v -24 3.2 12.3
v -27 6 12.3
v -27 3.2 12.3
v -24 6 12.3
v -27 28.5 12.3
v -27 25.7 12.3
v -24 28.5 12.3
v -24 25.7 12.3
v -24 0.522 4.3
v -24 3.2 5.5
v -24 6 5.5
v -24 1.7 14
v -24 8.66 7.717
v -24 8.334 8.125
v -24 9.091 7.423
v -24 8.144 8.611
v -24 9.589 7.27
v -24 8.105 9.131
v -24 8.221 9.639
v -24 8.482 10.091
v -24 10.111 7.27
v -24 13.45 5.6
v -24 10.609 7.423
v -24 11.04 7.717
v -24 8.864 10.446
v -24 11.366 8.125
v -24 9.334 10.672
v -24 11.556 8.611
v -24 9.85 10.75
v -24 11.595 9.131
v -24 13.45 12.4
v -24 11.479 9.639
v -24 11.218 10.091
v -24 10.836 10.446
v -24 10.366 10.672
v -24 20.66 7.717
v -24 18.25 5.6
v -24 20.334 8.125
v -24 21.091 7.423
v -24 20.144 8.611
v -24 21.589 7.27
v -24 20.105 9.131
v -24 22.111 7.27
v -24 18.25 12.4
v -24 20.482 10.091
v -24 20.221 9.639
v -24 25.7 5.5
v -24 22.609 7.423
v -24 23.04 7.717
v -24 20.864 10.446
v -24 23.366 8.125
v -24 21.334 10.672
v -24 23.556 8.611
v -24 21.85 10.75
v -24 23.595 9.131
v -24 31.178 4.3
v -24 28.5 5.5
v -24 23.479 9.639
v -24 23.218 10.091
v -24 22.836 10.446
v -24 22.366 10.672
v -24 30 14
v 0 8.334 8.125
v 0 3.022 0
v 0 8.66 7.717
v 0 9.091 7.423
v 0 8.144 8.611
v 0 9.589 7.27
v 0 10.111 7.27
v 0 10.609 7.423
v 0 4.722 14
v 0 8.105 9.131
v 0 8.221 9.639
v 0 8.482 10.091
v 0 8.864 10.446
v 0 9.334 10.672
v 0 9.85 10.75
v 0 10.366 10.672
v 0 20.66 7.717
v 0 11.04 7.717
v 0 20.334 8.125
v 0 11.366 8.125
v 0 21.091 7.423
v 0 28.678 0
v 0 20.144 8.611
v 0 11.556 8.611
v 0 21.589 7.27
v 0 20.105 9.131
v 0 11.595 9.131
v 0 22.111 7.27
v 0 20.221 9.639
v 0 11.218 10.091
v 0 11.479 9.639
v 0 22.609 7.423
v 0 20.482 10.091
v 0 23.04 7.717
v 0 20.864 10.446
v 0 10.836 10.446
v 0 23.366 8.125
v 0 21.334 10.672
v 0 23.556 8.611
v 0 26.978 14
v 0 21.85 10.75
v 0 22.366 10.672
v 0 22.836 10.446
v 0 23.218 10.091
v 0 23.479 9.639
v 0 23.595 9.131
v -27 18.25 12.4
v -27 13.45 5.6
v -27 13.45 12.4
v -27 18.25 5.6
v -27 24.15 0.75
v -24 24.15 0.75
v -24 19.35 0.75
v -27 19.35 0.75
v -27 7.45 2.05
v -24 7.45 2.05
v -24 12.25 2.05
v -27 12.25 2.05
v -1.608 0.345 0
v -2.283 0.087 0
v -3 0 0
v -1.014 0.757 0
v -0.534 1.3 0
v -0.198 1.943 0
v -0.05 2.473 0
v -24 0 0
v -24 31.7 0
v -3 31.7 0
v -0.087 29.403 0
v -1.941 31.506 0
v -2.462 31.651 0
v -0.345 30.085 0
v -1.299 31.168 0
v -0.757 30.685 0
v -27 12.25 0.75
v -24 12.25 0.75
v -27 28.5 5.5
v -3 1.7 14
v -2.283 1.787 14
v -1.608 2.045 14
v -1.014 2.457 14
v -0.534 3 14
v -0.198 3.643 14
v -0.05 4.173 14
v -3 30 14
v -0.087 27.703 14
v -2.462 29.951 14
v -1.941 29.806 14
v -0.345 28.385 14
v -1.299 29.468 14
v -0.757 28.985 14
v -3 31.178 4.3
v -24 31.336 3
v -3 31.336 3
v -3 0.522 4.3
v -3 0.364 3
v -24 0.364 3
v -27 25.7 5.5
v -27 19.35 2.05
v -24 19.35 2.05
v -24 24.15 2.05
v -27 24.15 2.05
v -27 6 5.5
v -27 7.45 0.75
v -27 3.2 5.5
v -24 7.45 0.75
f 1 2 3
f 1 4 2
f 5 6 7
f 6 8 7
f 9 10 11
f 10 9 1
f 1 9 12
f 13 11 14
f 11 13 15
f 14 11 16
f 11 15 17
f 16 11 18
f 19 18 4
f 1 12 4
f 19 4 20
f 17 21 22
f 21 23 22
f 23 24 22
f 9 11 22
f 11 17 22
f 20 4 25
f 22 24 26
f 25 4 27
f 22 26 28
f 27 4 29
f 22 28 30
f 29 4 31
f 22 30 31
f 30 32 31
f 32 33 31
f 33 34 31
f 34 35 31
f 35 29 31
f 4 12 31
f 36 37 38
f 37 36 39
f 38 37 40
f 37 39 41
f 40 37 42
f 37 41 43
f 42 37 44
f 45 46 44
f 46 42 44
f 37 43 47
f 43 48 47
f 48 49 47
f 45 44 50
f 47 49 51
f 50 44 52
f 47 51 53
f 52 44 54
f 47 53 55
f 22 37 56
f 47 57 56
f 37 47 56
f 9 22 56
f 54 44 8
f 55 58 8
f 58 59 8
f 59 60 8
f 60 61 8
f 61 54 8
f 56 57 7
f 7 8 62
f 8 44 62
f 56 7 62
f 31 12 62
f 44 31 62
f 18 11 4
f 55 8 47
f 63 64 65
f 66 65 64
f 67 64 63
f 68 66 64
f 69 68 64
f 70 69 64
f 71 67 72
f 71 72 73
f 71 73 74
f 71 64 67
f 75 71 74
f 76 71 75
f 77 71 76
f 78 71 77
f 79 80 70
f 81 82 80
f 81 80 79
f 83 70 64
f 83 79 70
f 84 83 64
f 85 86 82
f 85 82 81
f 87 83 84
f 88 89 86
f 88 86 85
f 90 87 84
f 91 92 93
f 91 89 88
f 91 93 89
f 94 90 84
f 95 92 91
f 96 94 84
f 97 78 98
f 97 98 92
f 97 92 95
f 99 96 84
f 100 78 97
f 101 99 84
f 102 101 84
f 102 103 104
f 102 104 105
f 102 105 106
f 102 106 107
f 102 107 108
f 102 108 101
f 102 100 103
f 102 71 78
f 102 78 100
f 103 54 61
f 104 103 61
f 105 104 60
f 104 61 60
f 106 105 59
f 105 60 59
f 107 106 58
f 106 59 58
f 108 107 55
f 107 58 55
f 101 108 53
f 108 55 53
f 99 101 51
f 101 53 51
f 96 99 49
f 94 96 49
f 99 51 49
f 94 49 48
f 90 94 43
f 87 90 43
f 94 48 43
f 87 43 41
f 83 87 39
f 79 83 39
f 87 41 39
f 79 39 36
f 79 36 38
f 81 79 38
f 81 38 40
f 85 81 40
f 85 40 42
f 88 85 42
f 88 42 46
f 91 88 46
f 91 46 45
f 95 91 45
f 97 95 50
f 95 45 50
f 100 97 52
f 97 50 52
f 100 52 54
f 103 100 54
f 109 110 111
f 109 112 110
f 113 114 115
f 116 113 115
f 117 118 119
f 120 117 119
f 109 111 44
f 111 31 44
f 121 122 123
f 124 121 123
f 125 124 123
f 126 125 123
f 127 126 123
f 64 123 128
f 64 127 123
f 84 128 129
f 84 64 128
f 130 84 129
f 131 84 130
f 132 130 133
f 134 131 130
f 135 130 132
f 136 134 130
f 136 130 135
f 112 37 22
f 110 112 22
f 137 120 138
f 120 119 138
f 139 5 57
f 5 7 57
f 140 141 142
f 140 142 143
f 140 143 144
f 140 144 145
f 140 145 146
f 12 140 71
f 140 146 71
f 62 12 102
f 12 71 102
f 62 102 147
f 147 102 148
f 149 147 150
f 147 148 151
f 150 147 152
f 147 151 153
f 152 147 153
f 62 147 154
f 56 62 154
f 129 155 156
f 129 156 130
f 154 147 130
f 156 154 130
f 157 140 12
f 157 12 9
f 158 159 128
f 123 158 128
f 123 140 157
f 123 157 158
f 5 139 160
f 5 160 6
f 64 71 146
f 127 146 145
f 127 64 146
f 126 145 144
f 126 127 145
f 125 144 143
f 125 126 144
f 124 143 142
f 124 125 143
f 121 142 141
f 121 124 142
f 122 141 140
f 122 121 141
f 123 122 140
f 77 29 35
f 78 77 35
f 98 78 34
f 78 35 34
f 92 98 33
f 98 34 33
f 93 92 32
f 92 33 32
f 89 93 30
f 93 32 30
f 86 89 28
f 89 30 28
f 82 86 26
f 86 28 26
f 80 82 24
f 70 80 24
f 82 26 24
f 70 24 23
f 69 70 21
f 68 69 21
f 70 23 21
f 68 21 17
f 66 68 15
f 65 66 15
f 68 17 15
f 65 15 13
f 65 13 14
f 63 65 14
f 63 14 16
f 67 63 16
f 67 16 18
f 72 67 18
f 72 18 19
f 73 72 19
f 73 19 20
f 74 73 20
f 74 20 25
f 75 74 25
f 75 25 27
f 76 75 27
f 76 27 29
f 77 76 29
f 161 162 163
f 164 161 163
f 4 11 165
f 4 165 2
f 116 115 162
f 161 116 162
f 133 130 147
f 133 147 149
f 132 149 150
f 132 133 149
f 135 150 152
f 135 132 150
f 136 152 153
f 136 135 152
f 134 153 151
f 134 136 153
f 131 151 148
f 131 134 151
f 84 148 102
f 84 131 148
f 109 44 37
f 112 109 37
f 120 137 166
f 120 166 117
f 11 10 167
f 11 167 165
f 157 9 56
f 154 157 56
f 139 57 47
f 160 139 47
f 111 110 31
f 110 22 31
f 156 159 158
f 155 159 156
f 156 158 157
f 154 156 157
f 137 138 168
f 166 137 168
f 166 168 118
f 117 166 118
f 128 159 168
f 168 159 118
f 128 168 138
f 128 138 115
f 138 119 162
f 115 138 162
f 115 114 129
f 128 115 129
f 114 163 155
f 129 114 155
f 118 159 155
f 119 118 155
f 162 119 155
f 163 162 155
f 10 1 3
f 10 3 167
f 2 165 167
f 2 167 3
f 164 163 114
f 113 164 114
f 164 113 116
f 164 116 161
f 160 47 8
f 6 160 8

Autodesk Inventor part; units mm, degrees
ref_plane "YZ Plane" through (0, 0, 0) normal (1, 0, 0) x (0, 1, 0)
ref_plane "XZ Plane" through (0, 0, 0) normal (0, 1, 0) x (-1, 0, 0)
ref_plane "XY Plane" through (0, 0, 0) normal (0, 0, 1) x (1, 0, 0)
sketch "スケッチ1" plane through (0, 0, 0) normal (1, 0, 0) x (0, 1, 0)
  line L0 (0, 0) -> (31.7, 0)
  line L1 (1.7, 14) -> (30, 14)
  line L2 (1.7, 14) -> (0, 0)
  line L3 (30, 14) -> (31.7, 0)
  dimension "d0" = 31.7
  dimension "d1" = 28.3
extrude "押し出し1" add sketch "スケッチ1" against normal blind 24
sketch "スケッチ2" plane through (-24, 0, 0) normal (-1, 0, 0) x (0, 0, 1)
  line L0 (0, 0) -> (14, 1.7) projected
  line L1 (3, 0.3643) -> (3, 31.3357)
  line L2 (14, 30) -> (0, 31.7) projected
  line L3 (4.3, 0.3643) -> (4.3, 31.3357)
  line L4 (4.3, 31.3357) -> (3, 31.3357)
  line L5 (4.3, 0.3643) -> (3, 0.3643)
  point P0 (4.3, 0.5221)
  point P1 (4.3, 31.1779)
extrude "押し出し2" cut sketch "スケッチ2" against normal blind 21 contours L1 L2 L3 L0
sketch "スケッチ4" plane through (-3, 0, 0) normal (-1, 0, 0) x (0, 0, 1)
  circle A0 centre (9, 9.85) radius 1.75
  circle A1 centre (9, 21.85) radius 1.75
  point P0 (0, 0)
  dimension "d10" = 3.5
  dimension "d11" = 3.5
extrude "押し出し4" cut sketch "スケッチ4" along normal mid plane 100
fillet "フィレット1" radius 3 2 edges at (0, 30.85, 7) (0, 0.85, 7)
sketch "スケッチ10" plane through (-24, 0, 0) normal (-1, 0, 0) x (0, 0, 1)
  line L0 (5.6, 13.45) -> (12.4, 13.45)
  line L1 (12.4, 13.45) -> (12.4, 18.25)
  line L2 (12.4, 18.25) -> (5.6, 18.25)
  line L3 (5.6, 18.25) -> (5.6, 13.45)
  line L4 (5.6, 13.45) -> (12.4, 18.25) construction
  line L5 (12.4, 13.45) -> (5.6, 18.25) construction
  line L6 (14, 1.7) -> (14, 30) projected
  point P0 (0, 0)
  point P1 (9, 15.85)
  point P2 (14, 15.85)
  dimension "d29" = 6.8
  dimension "d30" = 4.8
  dimension "d44" = 5
extrude "押し出し10" add sketch "スケッチ10" along normal blind 3
sketch "スケッチ11" plane through (-24, 0, 0) normal (-1, 0, 0) x (0, 0, 1)
  line L0 (12.3, 3.2) -> (5.5, 3.2)
  line L1 (5.5, 3.2) -> (5.5, 6)
  line L2 (5.5, 6) -> (12.3, 6)
  line L3 (12.3, 6) -> (12.3, 3.2)
  line L4 (12.3, 3.2) -> (5.5, 6) construction
  line L5 (5.5, 3.2) -> (12.3, 6) construction
  line L6 (12.3, 28.5) -> (5.5, 28.5)
  line L7 (5.5, 28.5) -> (5.5, 25.7)
  line L8 (5.5, 25.7) -> (12.3, 25.7)
  line L9 (12.3, 25.7) -> (12.3, 28.5)
  line L10 (12.3, 28.5) -> (5.5, 25.7) construction
  line L11 (5.5, 28.5) -> (12.3, 25.7) construction
  point P0 (0, 0)
  point P1 (8.9, 4.6)
  point P2 (8.9, 27.1)
  dimension "d33" = 6.8
  dimension "d34" = 2.8
  dimension "d35" = 6.8
  dimension "d36" = 2.8
extrude "押し出し11" add sketch "スケッチ11" along normal blind 3
sketch "スケッチ12" plane through (-24, 0, 0) normal (-1, 0, 0) x (0, 0, 1)
  line L0 (2.05, 24.15) -> (0.75, 24.15)
  line L1 (0.75, 24.15) -> (0.75, 19.35)
  line L2 (0.75, 19.35) -> (2.05, 19.35)
  line L3 (2.05, 19.35) -> (2.05, 24.15)
  line L4 (2.05, 24.15) -> (0.75, 19.35) construction
  line L5 (0.75, 24.15) -> (2.05, 19.35) construction
  line L6 (0.75, 7.45) -> (2.05, 7.45)
  line L7 (2.05, 7.45) -> (2.05, 12.25)
  line L8 (2.05, 12.25) -> (0.75, 12.25)
  line L9 (0.75, 12.25) -> (0.75, 7.45)
  line L10 (0.75, 7.45) -> (2.05, 12.25) construction
  line L11 (2.05, 7.45) -> (0.75, 12.25) construction
  point P0 (0, 0)
  point P1 (1.4, 21.75)
  point P2 (1.4, 9.85)
  dimension "d39" = 1.3
  dimension "d40" = 4.8
  dimension "d45" = 1.3
  dimension "d46" = 4.8
extrude "押し出し12" add sketch "スケッチ12" along normal blind 3 contours L3 L2 L1 L0
sketch "スケッチ13" plane through (-24, 0, 0) normal (-1, 0, 0) x (0, 0, 1)
  line L0 (2.05, 12.25) -> (0.75, 12.25)
  line L1 (0.75, 12.25) -> (0.75, 7.45)
  line L2 (0.75, 7.45) -> (2.05, 7.45)
  line L3 (2.05, 7.45) -> (2.05, 12.25)
  line L4 (2.05, 12.25) -> (0.75, 7.45) construction
  line L5 (0.75, 12.25) -> (2.05, 7.45) construction
  point P0 (0, 0)
  point P1 (1.4, 9.85)
  dimension "d47" = 1.3
  dimension "d48" = 4.8
extrude "押し出し13" add sketch "スケッチ13" along normal blind 3
properties part number "finlay_holds_down" material "ABS プラスチック"
